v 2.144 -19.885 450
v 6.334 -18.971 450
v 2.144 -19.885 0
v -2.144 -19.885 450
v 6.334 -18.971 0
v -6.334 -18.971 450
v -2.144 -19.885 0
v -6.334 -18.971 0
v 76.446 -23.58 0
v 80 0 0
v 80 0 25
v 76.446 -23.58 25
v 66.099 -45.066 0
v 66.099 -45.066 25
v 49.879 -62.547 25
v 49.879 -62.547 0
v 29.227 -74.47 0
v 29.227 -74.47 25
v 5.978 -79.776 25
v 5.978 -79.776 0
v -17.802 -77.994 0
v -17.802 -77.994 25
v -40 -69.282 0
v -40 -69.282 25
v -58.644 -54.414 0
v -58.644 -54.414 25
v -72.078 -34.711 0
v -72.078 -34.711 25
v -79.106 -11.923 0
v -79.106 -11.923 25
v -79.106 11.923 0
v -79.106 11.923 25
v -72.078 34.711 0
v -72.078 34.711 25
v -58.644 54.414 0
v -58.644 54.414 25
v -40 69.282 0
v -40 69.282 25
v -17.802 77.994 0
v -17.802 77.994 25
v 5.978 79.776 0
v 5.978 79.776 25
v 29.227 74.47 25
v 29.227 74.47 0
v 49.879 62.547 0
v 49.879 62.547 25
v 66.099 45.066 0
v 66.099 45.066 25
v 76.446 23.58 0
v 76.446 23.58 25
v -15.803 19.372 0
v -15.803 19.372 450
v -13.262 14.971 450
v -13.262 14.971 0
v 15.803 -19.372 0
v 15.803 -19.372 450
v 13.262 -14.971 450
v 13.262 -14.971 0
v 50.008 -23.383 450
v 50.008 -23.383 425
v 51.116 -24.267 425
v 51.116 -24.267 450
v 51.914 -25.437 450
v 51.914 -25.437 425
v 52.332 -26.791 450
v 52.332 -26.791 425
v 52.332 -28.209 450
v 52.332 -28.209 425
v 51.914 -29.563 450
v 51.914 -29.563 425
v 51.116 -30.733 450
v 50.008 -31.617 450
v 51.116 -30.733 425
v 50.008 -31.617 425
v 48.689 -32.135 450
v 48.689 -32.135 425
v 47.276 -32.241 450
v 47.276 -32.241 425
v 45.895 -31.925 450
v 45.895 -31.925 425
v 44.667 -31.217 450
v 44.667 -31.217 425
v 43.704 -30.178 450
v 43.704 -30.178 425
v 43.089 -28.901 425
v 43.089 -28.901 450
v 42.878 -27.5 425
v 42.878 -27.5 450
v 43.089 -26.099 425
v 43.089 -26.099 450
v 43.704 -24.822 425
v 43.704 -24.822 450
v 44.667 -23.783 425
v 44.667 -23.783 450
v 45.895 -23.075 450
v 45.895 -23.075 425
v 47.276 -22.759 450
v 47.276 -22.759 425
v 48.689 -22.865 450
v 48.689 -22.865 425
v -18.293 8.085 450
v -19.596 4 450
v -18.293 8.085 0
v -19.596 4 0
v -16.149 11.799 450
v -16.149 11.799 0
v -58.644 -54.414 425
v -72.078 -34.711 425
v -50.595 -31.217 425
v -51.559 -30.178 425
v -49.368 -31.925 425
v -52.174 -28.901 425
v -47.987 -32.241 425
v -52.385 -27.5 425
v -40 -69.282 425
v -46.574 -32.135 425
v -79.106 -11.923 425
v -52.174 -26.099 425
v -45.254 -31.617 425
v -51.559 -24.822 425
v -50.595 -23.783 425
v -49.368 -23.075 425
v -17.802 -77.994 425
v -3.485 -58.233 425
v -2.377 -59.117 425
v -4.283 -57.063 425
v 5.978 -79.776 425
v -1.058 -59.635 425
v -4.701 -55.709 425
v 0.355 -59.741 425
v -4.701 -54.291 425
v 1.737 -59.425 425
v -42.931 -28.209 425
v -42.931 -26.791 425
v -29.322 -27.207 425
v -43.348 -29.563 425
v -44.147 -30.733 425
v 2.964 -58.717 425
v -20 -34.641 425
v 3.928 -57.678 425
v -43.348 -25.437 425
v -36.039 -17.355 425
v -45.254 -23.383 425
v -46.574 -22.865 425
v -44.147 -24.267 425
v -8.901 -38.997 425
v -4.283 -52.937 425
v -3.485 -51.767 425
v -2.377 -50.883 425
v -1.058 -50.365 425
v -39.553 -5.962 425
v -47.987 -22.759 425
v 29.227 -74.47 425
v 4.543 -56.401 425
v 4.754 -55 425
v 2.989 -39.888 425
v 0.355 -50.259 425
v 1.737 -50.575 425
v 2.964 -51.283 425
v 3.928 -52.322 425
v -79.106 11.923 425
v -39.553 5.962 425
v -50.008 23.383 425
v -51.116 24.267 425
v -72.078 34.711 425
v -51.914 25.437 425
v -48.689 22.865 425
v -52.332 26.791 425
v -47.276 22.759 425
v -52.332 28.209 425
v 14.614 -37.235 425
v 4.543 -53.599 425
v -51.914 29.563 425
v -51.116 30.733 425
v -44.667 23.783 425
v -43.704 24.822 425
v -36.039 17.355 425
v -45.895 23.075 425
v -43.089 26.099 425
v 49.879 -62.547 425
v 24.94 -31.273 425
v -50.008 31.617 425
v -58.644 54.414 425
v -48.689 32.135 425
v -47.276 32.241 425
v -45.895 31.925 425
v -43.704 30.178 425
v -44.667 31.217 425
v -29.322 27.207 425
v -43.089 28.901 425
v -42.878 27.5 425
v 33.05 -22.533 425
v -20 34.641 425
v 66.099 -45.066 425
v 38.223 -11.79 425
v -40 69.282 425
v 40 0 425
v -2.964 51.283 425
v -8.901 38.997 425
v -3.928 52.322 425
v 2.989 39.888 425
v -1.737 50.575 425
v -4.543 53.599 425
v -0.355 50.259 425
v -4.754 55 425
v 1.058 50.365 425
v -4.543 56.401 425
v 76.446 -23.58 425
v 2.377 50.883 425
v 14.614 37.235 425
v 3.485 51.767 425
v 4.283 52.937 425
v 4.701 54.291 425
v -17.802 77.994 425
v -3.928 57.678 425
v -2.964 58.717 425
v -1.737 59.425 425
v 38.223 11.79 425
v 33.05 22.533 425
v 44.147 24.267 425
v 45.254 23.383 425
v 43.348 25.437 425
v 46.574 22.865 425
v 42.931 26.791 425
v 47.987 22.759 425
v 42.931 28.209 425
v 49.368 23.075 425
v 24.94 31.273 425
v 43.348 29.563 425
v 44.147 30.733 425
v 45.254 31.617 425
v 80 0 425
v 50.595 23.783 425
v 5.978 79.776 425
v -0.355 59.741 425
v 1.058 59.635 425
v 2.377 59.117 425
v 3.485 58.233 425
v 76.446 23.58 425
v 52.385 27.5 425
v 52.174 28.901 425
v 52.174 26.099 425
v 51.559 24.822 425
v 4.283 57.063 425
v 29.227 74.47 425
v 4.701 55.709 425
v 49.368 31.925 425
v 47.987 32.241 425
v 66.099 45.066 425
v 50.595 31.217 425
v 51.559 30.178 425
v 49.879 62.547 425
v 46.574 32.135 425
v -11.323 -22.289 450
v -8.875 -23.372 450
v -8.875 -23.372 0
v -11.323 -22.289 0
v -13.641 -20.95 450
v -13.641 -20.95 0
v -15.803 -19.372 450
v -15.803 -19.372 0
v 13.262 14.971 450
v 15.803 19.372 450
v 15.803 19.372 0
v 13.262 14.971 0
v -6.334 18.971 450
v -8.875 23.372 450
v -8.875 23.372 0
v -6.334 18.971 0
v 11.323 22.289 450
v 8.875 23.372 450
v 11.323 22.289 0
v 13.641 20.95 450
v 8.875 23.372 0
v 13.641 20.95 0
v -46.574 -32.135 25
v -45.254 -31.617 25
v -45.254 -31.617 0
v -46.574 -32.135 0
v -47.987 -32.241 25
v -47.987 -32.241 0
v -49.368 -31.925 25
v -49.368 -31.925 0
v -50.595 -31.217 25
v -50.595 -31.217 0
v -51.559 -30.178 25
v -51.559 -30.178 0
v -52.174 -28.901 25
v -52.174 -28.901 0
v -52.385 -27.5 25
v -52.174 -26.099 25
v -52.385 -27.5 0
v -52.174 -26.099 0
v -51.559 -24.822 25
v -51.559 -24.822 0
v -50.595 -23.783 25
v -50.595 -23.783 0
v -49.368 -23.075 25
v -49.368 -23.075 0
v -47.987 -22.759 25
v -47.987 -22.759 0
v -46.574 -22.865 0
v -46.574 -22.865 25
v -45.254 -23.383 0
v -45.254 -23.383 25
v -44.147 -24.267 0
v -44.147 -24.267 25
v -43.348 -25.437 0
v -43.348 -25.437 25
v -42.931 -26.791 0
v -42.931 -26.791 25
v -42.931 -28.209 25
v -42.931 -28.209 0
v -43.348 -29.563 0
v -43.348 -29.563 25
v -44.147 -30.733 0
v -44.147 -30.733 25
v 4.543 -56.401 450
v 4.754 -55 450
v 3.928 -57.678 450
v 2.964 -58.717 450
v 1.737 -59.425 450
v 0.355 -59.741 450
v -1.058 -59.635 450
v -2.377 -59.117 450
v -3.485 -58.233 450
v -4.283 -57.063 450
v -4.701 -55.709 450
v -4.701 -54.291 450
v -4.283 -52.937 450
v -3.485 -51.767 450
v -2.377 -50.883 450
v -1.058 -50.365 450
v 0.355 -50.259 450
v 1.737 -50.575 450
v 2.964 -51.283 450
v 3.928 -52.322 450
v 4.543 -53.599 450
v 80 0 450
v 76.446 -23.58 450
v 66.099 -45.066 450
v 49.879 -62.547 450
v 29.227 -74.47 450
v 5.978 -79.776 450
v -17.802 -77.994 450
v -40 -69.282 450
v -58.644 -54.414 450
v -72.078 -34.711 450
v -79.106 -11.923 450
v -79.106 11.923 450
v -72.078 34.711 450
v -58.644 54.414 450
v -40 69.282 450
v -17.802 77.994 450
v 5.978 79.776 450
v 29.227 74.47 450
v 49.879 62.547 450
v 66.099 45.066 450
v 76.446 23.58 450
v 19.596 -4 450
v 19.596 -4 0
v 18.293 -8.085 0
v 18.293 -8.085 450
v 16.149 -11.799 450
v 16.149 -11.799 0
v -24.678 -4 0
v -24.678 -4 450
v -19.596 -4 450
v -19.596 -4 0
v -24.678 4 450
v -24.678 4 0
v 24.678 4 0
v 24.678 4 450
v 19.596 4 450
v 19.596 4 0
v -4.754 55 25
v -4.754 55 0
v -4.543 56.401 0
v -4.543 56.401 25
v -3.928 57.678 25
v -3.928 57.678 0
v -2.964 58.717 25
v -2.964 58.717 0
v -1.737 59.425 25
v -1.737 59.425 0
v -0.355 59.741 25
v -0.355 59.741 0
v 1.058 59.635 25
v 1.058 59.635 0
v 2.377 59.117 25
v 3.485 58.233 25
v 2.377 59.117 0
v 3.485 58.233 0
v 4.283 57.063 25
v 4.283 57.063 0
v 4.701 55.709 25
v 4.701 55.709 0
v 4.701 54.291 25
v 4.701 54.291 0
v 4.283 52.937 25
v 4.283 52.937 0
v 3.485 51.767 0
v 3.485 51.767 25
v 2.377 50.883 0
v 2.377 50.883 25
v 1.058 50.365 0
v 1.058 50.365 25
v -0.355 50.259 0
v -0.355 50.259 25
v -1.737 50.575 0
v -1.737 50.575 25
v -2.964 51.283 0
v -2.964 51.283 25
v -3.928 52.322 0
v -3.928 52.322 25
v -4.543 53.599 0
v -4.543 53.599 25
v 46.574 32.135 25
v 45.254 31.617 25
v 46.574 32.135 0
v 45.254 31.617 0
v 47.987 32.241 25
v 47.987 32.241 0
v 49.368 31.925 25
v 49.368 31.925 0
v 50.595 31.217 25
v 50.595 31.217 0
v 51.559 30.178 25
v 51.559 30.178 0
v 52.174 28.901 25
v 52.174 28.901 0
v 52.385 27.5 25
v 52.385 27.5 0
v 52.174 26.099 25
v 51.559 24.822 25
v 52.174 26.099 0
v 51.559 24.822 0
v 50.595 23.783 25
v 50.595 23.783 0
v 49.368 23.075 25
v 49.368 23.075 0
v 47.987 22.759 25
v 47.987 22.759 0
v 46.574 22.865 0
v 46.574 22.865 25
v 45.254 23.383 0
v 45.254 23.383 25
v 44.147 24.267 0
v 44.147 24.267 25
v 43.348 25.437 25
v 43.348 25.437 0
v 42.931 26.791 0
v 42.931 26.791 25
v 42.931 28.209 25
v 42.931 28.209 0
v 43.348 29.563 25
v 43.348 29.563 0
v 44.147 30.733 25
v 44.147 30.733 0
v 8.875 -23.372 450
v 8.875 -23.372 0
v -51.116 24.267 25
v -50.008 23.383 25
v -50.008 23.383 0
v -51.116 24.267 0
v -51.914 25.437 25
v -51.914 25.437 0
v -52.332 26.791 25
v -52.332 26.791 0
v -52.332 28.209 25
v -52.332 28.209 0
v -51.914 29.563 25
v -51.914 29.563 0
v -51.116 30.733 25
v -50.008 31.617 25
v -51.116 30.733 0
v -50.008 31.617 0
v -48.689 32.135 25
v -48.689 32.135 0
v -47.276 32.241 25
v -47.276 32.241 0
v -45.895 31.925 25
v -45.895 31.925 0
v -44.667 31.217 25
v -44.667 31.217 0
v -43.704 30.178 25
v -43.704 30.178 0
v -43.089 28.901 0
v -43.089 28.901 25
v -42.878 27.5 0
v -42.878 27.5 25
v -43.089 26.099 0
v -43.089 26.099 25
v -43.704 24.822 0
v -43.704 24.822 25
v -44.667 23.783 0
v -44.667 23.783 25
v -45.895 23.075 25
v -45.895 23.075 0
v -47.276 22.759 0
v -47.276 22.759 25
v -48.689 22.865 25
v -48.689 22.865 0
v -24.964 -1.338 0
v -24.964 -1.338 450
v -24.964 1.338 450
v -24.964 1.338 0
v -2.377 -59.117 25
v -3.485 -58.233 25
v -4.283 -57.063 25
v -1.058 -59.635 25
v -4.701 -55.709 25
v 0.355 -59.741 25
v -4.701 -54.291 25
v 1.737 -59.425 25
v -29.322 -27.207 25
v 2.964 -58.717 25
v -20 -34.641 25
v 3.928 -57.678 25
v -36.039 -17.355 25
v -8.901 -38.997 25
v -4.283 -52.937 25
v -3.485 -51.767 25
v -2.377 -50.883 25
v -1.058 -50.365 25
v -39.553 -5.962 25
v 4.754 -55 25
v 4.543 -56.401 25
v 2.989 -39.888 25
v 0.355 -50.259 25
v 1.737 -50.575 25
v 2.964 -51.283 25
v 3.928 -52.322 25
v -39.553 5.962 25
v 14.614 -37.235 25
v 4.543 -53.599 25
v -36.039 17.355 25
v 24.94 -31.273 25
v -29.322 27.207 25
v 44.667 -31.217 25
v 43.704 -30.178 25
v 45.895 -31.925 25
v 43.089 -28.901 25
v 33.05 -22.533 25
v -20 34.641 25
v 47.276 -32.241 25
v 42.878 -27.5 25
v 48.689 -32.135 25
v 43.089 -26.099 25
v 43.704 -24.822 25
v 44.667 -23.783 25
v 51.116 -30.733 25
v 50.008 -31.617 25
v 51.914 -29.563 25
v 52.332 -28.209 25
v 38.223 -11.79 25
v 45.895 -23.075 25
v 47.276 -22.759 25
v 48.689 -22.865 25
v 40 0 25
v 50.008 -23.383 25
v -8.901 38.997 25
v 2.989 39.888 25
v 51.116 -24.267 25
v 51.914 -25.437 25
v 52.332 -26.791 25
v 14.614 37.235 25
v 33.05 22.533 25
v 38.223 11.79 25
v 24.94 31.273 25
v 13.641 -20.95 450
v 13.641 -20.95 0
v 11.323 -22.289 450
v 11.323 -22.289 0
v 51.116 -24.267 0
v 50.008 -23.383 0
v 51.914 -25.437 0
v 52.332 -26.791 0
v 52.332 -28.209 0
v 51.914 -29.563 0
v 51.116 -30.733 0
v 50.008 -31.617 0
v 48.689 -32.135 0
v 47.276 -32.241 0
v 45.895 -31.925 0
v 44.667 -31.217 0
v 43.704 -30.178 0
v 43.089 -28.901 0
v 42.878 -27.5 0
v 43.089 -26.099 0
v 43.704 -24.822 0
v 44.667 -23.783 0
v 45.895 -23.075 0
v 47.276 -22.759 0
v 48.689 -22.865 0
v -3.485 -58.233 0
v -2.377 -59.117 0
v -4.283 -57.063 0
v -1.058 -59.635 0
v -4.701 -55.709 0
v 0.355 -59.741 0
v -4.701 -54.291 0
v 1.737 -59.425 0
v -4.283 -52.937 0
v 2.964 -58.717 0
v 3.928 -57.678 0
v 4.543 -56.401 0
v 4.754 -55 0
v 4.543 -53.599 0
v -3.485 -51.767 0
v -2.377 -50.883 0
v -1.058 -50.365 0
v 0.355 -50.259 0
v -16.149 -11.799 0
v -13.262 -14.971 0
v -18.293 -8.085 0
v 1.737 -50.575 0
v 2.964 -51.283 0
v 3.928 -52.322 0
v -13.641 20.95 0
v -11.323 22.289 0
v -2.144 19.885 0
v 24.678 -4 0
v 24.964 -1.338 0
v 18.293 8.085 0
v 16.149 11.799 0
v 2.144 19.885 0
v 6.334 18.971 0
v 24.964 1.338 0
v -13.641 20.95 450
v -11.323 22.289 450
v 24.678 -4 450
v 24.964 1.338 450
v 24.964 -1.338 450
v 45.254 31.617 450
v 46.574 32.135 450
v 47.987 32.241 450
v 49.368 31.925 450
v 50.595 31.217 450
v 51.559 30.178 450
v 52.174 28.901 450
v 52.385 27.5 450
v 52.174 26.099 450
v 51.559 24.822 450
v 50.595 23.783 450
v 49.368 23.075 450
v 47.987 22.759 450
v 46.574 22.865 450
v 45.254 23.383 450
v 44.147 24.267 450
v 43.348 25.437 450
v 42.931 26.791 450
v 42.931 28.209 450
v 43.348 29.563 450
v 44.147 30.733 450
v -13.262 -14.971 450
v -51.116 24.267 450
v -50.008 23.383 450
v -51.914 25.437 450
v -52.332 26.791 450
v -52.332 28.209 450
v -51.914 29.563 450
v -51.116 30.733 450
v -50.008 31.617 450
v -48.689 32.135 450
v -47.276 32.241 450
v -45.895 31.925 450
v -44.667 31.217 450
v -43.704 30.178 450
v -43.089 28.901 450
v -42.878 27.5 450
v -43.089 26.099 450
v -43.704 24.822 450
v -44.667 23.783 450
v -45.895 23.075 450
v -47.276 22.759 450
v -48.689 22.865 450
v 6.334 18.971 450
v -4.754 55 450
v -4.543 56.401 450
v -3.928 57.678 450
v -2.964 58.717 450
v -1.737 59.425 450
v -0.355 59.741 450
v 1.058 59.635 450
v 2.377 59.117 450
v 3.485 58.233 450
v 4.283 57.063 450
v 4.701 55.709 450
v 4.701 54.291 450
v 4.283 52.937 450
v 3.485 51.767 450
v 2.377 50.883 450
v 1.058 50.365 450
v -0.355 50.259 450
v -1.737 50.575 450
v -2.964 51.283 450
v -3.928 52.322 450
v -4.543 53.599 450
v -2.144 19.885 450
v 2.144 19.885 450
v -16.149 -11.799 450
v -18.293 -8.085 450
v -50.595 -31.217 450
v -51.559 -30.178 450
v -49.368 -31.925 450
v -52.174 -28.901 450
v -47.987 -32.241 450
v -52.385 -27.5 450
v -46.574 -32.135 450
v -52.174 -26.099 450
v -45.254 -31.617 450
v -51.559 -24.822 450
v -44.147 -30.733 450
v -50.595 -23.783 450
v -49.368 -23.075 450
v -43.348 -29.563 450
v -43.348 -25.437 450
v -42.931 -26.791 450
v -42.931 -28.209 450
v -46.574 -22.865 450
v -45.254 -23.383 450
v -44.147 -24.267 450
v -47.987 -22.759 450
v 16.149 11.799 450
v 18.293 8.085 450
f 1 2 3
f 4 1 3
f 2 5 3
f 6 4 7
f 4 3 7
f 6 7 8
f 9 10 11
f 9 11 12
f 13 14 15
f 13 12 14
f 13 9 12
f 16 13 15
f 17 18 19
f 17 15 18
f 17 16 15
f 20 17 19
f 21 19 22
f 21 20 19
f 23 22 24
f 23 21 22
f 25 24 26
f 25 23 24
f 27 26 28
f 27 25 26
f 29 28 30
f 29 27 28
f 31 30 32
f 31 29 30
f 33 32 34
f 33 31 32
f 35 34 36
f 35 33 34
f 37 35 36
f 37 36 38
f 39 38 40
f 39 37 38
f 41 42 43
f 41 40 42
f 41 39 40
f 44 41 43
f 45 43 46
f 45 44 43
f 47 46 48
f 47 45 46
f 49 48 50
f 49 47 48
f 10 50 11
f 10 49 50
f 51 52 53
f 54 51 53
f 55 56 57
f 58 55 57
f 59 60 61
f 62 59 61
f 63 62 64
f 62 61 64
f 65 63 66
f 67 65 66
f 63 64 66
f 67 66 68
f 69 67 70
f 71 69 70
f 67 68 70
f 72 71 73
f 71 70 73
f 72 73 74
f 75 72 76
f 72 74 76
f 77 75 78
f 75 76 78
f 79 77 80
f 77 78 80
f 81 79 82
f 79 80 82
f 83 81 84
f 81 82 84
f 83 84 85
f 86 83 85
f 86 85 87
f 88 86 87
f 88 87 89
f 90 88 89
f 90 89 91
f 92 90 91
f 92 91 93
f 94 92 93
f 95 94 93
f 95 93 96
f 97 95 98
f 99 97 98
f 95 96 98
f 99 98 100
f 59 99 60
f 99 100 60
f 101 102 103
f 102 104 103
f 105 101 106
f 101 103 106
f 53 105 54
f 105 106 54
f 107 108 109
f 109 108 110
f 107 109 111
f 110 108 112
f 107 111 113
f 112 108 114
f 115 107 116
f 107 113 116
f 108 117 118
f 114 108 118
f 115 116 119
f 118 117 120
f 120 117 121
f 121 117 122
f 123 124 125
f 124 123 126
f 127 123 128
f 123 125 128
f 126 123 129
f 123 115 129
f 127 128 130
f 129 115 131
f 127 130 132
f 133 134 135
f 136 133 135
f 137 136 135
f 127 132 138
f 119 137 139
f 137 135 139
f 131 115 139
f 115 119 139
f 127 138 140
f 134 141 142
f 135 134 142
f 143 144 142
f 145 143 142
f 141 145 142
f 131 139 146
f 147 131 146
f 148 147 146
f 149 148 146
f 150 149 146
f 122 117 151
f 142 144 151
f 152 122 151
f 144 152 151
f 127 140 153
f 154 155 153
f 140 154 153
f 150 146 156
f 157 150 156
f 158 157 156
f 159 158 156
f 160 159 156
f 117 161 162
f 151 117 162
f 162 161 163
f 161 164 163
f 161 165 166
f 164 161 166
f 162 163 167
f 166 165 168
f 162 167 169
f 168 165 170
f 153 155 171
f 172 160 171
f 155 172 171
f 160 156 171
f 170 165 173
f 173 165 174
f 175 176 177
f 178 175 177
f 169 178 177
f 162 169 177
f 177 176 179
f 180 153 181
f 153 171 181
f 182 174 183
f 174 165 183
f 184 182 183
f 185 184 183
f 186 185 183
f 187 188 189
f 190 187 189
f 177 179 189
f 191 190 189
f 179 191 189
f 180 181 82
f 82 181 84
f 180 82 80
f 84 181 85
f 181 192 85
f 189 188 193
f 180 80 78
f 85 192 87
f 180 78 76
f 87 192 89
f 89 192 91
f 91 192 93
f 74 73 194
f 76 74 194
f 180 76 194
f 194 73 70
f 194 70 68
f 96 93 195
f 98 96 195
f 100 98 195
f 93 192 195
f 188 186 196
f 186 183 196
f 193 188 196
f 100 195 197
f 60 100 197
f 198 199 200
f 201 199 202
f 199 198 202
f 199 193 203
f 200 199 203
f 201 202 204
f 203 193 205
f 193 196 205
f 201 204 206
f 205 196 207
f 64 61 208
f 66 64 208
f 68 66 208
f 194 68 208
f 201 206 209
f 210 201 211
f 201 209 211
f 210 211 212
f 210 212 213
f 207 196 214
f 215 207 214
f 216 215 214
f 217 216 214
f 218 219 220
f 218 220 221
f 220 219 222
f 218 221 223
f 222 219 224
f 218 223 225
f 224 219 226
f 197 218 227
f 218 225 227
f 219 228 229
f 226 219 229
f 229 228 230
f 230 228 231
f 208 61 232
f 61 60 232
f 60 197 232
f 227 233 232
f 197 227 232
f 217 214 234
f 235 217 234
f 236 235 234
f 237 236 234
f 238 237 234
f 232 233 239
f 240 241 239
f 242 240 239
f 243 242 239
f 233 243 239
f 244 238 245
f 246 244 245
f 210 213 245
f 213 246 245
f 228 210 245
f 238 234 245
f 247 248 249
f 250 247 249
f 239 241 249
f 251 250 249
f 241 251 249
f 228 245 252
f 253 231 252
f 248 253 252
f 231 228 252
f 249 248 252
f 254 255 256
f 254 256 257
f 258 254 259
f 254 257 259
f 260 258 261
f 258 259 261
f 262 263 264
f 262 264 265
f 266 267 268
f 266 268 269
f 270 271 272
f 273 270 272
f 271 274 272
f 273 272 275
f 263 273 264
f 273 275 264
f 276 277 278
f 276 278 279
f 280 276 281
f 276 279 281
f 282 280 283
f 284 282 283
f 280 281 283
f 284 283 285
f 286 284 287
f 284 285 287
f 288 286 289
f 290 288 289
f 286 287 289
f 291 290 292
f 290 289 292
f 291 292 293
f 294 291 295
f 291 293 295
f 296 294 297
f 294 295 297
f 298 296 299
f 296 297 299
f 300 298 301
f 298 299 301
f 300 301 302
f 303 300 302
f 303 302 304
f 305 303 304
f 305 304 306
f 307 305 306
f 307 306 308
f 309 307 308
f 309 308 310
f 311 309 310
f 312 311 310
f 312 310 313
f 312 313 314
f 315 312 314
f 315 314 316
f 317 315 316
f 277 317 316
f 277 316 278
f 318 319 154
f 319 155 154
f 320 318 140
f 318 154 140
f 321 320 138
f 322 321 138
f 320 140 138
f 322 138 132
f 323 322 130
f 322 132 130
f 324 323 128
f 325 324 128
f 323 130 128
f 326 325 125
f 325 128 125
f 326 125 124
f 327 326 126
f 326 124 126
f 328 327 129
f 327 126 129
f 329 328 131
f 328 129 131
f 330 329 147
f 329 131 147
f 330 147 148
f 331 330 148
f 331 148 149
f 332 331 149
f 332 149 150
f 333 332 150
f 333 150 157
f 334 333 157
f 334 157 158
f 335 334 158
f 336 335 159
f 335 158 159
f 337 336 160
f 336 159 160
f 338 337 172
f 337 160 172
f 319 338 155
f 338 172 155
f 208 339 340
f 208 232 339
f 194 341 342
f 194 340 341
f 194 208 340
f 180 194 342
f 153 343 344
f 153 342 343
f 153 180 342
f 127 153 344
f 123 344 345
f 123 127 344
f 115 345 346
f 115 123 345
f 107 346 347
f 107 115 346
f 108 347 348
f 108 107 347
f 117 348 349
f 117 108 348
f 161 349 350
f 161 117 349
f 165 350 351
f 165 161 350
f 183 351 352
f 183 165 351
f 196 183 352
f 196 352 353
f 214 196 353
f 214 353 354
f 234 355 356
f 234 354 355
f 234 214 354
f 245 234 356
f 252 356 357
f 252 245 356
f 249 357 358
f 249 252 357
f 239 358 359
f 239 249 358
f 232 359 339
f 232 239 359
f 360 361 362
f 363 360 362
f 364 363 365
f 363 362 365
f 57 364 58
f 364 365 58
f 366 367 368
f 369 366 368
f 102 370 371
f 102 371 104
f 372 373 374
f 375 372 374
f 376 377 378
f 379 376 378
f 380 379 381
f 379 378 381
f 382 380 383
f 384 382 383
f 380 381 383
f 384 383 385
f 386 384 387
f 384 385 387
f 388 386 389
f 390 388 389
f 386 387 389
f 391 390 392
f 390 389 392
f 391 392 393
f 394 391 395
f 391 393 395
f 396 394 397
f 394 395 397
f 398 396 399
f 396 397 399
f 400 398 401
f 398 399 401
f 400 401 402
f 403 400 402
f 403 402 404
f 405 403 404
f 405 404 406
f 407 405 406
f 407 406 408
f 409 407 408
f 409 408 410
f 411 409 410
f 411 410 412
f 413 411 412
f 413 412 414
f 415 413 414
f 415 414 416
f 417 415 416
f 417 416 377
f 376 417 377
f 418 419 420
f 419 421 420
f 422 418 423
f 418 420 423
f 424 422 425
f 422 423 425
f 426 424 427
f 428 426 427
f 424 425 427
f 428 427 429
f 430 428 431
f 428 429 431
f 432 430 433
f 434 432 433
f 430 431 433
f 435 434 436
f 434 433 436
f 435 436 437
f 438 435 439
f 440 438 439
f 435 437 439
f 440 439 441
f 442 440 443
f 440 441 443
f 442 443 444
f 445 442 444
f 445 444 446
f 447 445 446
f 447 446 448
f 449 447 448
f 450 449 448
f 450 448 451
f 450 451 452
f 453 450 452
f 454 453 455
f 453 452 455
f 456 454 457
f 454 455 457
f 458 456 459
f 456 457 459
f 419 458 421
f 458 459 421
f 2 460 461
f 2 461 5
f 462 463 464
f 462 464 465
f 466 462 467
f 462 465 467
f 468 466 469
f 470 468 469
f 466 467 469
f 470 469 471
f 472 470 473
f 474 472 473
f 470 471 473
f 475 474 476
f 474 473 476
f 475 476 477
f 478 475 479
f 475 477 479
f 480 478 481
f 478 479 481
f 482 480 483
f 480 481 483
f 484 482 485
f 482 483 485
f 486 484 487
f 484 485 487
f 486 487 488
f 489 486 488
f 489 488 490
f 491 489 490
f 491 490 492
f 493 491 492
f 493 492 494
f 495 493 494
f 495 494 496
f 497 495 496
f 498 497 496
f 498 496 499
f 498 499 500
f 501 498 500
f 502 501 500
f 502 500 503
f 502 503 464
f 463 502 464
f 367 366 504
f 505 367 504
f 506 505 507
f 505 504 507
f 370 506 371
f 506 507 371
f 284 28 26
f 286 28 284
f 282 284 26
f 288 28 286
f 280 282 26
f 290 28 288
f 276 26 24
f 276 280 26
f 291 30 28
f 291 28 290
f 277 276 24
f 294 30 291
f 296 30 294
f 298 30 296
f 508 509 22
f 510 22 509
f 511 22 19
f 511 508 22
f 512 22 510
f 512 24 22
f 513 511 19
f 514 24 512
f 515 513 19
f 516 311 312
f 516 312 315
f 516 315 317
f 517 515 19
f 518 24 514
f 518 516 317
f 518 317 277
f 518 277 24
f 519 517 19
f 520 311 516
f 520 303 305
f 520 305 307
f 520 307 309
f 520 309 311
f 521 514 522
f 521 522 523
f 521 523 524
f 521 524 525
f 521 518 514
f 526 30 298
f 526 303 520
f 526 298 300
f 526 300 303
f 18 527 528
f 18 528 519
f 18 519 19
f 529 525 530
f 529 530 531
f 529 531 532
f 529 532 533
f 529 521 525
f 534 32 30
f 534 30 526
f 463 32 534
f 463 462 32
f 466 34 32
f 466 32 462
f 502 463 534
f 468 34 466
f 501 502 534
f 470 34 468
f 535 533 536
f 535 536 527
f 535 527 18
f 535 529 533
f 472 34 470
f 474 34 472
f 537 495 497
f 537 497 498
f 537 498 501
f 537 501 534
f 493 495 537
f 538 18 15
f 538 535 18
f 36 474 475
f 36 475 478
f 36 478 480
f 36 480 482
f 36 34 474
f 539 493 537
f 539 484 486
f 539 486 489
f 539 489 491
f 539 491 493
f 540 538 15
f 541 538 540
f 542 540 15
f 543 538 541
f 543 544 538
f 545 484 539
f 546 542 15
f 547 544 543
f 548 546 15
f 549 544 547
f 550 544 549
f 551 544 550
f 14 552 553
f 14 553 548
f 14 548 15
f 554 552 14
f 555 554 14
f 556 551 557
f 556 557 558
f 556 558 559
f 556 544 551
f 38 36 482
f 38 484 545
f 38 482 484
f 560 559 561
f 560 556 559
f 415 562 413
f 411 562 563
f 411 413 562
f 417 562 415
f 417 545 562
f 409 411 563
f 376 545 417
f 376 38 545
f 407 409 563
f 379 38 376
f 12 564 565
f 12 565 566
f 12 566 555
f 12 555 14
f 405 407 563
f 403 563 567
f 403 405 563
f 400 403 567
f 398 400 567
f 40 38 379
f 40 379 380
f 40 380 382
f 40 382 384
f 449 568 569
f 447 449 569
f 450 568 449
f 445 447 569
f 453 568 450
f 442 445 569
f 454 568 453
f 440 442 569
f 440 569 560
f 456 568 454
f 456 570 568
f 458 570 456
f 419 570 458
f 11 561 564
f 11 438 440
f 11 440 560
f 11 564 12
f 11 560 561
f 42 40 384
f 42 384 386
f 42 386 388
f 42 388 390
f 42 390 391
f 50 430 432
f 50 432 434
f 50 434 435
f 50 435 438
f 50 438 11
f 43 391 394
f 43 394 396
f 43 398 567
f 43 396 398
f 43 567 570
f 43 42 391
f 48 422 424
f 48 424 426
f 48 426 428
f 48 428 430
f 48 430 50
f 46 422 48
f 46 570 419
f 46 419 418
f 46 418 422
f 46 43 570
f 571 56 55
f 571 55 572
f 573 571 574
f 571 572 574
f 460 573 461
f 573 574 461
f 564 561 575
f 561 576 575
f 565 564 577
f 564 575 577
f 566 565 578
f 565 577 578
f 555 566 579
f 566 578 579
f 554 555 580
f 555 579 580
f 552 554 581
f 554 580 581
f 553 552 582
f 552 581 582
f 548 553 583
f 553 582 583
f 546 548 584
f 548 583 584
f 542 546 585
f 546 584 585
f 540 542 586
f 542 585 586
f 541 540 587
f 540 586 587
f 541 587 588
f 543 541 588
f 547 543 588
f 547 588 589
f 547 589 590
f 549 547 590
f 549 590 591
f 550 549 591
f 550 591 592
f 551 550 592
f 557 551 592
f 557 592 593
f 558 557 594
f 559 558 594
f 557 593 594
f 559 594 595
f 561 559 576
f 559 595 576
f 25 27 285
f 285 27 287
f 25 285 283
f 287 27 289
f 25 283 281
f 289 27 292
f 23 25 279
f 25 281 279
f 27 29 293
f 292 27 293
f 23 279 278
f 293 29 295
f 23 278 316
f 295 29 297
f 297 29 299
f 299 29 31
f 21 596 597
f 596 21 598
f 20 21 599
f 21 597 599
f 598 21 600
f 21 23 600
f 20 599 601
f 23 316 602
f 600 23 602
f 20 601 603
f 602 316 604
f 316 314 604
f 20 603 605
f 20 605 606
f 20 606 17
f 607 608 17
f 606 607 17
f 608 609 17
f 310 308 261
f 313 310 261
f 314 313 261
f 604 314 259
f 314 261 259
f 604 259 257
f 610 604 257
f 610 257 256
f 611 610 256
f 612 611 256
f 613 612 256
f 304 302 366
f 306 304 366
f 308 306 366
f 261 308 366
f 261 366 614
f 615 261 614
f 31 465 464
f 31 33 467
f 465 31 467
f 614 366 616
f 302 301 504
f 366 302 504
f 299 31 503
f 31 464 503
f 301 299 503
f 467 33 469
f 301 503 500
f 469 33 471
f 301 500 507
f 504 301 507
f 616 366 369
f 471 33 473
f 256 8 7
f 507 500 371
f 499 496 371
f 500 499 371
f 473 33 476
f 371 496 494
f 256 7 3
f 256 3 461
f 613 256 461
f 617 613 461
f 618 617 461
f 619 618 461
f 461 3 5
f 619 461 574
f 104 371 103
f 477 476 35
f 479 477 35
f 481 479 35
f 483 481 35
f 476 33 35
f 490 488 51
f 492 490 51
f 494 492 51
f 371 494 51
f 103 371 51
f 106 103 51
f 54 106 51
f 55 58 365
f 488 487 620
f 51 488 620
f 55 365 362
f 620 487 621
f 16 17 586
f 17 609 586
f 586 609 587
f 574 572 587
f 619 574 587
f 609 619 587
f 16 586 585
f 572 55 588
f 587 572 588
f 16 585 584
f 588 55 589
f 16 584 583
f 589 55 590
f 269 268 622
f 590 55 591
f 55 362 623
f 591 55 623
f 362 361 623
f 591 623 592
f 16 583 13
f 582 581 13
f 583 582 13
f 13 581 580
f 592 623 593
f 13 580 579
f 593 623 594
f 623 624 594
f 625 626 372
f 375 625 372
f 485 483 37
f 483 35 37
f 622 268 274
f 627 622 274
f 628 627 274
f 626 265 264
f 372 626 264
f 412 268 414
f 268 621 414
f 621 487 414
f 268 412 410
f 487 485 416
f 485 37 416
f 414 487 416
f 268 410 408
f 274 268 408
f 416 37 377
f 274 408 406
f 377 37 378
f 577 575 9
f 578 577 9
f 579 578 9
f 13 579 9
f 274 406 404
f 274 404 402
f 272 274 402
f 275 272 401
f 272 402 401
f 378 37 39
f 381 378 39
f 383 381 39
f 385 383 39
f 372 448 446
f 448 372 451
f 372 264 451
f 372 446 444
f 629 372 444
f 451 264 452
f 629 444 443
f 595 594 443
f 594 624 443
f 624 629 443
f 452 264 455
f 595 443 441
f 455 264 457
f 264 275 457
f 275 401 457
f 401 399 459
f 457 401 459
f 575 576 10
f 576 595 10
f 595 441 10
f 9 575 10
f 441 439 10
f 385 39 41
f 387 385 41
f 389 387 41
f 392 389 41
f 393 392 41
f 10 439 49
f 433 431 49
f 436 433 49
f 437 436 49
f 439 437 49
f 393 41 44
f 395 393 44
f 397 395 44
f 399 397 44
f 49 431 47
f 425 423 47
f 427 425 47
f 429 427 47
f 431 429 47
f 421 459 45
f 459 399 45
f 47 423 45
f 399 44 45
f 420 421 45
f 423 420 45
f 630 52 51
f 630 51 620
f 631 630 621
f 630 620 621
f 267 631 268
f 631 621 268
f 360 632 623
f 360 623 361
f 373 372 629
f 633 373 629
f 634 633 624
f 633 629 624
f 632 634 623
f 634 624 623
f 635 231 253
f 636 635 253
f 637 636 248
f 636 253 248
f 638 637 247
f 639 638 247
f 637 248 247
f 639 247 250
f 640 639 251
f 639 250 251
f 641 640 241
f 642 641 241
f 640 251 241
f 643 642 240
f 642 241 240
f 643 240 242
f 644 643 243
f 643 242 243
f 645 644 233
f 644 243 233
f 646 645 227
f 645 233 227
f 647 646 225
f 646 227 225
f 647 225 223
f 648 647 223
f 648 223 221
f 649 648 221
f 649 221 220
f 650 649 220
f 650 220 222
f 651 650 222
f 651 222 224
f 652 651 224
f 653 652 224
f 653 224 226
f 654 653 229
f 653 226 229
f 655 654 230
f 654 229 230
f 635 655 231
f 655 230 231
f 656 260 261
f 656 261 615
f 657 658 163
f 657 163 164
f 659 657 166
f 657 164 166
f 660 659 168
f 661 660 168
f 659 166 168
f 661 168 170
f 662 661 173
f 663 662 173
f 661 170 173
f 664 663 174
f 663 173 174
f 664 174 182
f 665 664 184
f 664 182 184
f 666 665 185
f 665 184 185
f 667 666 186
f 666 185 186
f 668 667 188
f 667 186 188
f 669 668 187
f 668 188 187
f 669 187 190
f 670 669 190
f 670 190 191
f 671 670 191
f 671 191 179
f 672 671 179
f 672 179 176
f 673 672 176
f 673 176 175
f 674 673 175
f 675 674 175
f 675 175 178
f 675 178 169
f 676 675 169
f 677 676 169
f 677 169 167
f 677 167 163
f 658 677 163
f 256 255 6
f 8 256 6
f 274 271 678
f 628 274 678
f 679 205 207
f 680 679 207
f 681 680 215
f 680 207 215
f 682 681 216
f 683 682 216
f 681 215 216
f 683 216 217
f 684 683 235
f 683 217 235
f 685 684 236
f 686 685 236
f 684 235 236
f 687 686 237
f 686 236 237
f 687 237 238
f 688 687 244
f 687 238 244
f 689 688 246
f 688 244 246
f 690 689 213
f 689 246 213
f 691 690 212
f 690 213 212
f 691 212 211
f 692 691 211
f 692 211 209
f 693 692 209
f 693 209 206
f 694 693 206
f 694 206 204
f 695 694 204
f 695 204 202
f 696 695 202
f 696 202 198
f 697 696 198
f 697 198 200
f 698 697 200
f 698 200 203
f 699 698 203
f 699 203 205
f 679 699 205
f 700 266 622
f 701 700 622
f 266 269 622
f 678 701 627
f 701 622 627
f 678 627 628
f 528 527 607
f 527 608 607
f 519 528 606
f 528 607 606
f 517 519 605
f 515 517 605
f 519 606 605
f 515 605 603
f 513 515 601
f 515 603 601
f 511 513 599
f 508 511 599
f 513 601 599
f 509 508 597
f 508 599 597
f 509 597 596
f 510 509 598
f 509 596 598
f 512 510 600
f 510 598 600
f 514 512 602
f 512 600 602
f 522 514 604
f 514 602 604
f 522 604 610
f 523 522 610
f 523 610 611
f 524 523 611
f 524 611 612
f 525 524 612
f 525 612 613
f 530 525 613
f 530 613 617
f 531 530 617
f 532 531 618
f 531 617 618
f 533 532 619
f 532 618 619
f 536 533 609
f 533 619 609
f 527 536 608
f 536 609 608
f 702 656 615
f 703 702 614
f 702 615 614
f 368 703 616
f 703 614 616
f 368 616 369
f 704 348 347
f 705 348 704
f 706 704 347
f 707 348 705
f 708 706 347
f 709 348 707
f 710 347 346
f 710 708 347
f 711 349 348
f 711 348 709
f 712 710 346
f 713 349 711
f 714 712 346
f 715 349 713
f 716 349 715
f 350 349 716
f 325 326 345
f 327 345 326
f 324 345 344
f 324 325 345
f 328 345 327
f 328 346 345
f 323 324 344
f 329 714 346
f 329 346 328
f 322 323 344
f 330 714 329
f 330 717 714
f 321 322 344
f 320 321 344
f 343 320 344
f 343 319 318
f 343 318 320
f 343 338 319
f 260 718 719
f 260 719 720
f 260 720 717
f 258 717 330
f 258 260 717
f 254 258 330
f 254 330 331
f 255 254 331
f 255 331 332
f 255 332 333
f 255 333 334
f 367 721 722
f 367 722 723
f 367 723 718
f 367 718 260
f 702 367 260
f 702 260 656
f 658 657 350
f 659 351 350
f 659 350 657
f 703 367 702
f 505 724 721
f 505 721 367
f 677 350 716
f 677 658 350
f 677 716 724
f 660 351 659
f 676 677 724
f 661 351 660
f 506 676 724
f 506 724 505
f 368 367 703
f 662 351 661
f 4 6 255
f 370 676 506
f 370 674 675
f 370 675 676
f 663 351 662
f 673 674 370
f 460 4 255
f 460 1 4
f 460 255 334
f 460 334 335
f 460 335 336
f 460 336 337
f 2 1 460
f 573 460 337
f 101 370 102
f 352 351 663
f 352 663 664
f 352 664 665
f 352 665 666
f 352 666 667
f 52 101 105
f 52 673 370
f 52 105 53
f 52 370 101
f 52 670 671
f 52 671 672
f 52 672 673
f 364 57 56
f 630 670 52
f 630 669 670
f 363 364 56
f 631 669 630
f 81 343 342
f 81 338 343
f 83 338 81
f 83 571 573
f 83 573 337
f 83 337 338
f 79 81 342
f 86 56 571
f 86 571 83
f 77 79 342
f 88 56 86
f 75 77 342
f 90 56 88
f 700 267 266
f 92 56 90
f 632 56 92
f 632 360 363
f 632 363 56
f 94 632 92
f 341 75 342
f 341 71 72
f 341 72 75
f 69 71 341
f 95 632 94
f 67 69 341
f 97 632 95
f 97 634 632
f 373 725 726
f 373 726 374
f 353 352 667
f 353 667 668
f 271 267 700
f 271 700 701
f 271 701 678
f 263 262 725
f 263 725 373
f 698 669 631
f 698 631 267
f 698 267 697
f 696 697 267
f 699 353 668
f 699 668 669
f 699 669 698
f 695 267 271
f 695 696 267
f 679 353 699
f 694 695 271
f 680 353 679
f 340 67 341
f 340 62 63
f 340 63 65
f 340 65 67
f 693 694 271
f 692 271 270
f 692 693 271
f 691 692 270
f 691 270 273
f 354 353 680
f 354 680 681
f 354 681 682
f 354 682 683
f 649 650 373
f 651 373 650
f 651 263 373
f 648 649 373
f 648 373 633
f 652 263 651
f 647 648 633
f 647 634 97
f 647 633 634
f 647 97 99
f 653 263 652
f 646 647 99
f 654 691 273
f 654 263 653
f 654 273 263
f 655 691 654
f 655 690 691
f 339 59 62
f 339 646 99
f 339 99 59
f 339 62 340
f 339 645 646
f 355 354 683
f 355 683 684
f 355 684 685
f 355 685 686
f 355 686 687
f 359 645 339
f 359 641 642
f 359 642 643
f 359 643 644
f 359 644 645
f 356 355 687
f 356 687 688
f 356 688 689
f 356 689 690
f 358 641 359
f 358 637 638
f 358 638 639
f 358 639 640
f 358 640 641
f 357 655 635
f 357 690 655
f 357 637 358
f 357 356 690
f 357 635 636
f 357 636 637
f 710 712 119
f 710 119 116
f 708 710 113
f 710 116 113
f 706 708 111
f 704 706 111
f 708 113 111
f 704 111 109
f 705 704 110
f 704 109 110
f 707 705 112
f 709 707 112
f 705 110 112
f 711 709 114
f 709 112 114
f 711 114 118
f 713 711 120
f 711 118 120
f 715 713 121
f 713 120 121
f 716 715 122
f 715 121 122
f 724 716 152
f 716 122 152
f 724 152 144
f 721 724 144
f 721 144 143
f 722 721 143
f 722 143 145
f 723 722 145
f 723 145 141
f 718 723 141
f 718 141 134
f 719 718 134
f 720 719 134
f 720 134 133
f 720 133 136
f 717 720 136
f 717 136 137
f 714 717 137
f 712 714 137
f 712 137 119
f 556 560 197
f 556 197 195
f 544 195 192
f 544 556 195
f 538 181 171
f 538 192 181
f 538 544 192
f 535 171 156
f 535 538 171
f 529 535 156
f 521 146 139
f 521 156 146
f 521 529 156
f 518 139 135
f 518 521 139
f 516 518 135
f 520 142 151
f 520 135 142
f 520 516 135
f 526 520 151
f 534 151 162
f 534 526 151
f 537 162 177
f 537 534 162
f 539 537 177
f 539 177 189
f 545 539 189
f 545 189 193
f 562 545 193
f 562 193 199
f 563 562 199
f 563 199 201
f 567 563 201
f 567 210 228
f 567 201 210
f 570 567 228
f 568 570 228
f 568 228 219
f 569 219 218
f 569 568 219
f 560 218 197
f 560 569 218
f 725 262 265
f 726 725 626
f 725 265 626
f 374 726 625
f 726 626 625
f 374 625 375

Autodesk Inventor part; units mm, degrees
ref_plane "YZ Plane" through (0, 0, 0) normal (1, 0, 0) x (0, 1, 0)
ref_plane "XZ Plane" through (0, 0, 0) normal (0, 1, 0) x (-1, 0, 0)
ref_plane "XY Plane" through (0, 0, 0) normal (0, 0, 1) x (1, 0, 0)
sketch "草图1" plane through (0, 0, 0) normal (0, 0, 1) x (1, 0, 0)
  circle A0 centre (0, 0) radius 80
  dimension "d0" = 160
extrude "拉伸1" add sketch "草图1" along normal blind 25
sketch "草图2" plane through (0, 0, 25) normal (0, 0, 1) x (1, 0, 0)
  circle A0 centre (0, 0) radius 40
  dimension "d3" = 80
extrude "拉伸2" add sketch "草图2" along normal blind 400
sketch "草图3" plane through (0, 0, 0) normal (0, 0, -1) x (-1, 0, 0)
  circle A0 centre (0, 55) radius 4.7538
  line L0 (0, 0) -> (0, 9.1463)
  dimension "d6" = 9.1463
  dimension "d7" = 55
extrude "拉伸3" cut sketch "草图3" against normal through all
pattern_circular "环形阵列1" count 6 over 360 about axis through (0, 0, -10) along (0, 0, 1) of "拉伸3"
pattern_linear "矩形阵列1" count 2 spacing 425 along (0, 0, 1) of "拉伸3", "环形阵列1", "拉伸1"
sketch "草图4" plane through (0, 0, 0) normal (0, 0, -1) x (-1, 0, 0)
  circle A0 centre (0, 0) radius 20
  dimension "d16" = 40
extrude "拉伸4" cut sketch "草图4" against normal through all
sketch "草图5" plane through (0, 0, 0) normal (0, 0, -1) x (-1, 0, 0)
  circle A0 centre (0, 0) radius 25
  circle A1 centre (0, 0) radius 20
  circle A2 centre (0, 0) radius 20 projected
  line L0 (24.6779, 4) -> (19.5959, 4)
  line L1 (24.6779, -4) -> (19.5959, -4)
  line L2 (0, 0) -> (7.5201, 0)
  dimension "d19" = 50
  dimension "d20" = 7.5201
  dimension "d21" = 4
  dimension "d22" = 8
extrude "拉伸5" cut sketch "草图5" against normal through all contours A0 L1 A1 L0 picked at (21.5439, 2.2304)
pattern_circular "环形阵列2" count 6 over 360 about axis through (0, 0, -10) along (0, 0, 1) of "拉伸5"
properties part number "主动轮连接筒"
